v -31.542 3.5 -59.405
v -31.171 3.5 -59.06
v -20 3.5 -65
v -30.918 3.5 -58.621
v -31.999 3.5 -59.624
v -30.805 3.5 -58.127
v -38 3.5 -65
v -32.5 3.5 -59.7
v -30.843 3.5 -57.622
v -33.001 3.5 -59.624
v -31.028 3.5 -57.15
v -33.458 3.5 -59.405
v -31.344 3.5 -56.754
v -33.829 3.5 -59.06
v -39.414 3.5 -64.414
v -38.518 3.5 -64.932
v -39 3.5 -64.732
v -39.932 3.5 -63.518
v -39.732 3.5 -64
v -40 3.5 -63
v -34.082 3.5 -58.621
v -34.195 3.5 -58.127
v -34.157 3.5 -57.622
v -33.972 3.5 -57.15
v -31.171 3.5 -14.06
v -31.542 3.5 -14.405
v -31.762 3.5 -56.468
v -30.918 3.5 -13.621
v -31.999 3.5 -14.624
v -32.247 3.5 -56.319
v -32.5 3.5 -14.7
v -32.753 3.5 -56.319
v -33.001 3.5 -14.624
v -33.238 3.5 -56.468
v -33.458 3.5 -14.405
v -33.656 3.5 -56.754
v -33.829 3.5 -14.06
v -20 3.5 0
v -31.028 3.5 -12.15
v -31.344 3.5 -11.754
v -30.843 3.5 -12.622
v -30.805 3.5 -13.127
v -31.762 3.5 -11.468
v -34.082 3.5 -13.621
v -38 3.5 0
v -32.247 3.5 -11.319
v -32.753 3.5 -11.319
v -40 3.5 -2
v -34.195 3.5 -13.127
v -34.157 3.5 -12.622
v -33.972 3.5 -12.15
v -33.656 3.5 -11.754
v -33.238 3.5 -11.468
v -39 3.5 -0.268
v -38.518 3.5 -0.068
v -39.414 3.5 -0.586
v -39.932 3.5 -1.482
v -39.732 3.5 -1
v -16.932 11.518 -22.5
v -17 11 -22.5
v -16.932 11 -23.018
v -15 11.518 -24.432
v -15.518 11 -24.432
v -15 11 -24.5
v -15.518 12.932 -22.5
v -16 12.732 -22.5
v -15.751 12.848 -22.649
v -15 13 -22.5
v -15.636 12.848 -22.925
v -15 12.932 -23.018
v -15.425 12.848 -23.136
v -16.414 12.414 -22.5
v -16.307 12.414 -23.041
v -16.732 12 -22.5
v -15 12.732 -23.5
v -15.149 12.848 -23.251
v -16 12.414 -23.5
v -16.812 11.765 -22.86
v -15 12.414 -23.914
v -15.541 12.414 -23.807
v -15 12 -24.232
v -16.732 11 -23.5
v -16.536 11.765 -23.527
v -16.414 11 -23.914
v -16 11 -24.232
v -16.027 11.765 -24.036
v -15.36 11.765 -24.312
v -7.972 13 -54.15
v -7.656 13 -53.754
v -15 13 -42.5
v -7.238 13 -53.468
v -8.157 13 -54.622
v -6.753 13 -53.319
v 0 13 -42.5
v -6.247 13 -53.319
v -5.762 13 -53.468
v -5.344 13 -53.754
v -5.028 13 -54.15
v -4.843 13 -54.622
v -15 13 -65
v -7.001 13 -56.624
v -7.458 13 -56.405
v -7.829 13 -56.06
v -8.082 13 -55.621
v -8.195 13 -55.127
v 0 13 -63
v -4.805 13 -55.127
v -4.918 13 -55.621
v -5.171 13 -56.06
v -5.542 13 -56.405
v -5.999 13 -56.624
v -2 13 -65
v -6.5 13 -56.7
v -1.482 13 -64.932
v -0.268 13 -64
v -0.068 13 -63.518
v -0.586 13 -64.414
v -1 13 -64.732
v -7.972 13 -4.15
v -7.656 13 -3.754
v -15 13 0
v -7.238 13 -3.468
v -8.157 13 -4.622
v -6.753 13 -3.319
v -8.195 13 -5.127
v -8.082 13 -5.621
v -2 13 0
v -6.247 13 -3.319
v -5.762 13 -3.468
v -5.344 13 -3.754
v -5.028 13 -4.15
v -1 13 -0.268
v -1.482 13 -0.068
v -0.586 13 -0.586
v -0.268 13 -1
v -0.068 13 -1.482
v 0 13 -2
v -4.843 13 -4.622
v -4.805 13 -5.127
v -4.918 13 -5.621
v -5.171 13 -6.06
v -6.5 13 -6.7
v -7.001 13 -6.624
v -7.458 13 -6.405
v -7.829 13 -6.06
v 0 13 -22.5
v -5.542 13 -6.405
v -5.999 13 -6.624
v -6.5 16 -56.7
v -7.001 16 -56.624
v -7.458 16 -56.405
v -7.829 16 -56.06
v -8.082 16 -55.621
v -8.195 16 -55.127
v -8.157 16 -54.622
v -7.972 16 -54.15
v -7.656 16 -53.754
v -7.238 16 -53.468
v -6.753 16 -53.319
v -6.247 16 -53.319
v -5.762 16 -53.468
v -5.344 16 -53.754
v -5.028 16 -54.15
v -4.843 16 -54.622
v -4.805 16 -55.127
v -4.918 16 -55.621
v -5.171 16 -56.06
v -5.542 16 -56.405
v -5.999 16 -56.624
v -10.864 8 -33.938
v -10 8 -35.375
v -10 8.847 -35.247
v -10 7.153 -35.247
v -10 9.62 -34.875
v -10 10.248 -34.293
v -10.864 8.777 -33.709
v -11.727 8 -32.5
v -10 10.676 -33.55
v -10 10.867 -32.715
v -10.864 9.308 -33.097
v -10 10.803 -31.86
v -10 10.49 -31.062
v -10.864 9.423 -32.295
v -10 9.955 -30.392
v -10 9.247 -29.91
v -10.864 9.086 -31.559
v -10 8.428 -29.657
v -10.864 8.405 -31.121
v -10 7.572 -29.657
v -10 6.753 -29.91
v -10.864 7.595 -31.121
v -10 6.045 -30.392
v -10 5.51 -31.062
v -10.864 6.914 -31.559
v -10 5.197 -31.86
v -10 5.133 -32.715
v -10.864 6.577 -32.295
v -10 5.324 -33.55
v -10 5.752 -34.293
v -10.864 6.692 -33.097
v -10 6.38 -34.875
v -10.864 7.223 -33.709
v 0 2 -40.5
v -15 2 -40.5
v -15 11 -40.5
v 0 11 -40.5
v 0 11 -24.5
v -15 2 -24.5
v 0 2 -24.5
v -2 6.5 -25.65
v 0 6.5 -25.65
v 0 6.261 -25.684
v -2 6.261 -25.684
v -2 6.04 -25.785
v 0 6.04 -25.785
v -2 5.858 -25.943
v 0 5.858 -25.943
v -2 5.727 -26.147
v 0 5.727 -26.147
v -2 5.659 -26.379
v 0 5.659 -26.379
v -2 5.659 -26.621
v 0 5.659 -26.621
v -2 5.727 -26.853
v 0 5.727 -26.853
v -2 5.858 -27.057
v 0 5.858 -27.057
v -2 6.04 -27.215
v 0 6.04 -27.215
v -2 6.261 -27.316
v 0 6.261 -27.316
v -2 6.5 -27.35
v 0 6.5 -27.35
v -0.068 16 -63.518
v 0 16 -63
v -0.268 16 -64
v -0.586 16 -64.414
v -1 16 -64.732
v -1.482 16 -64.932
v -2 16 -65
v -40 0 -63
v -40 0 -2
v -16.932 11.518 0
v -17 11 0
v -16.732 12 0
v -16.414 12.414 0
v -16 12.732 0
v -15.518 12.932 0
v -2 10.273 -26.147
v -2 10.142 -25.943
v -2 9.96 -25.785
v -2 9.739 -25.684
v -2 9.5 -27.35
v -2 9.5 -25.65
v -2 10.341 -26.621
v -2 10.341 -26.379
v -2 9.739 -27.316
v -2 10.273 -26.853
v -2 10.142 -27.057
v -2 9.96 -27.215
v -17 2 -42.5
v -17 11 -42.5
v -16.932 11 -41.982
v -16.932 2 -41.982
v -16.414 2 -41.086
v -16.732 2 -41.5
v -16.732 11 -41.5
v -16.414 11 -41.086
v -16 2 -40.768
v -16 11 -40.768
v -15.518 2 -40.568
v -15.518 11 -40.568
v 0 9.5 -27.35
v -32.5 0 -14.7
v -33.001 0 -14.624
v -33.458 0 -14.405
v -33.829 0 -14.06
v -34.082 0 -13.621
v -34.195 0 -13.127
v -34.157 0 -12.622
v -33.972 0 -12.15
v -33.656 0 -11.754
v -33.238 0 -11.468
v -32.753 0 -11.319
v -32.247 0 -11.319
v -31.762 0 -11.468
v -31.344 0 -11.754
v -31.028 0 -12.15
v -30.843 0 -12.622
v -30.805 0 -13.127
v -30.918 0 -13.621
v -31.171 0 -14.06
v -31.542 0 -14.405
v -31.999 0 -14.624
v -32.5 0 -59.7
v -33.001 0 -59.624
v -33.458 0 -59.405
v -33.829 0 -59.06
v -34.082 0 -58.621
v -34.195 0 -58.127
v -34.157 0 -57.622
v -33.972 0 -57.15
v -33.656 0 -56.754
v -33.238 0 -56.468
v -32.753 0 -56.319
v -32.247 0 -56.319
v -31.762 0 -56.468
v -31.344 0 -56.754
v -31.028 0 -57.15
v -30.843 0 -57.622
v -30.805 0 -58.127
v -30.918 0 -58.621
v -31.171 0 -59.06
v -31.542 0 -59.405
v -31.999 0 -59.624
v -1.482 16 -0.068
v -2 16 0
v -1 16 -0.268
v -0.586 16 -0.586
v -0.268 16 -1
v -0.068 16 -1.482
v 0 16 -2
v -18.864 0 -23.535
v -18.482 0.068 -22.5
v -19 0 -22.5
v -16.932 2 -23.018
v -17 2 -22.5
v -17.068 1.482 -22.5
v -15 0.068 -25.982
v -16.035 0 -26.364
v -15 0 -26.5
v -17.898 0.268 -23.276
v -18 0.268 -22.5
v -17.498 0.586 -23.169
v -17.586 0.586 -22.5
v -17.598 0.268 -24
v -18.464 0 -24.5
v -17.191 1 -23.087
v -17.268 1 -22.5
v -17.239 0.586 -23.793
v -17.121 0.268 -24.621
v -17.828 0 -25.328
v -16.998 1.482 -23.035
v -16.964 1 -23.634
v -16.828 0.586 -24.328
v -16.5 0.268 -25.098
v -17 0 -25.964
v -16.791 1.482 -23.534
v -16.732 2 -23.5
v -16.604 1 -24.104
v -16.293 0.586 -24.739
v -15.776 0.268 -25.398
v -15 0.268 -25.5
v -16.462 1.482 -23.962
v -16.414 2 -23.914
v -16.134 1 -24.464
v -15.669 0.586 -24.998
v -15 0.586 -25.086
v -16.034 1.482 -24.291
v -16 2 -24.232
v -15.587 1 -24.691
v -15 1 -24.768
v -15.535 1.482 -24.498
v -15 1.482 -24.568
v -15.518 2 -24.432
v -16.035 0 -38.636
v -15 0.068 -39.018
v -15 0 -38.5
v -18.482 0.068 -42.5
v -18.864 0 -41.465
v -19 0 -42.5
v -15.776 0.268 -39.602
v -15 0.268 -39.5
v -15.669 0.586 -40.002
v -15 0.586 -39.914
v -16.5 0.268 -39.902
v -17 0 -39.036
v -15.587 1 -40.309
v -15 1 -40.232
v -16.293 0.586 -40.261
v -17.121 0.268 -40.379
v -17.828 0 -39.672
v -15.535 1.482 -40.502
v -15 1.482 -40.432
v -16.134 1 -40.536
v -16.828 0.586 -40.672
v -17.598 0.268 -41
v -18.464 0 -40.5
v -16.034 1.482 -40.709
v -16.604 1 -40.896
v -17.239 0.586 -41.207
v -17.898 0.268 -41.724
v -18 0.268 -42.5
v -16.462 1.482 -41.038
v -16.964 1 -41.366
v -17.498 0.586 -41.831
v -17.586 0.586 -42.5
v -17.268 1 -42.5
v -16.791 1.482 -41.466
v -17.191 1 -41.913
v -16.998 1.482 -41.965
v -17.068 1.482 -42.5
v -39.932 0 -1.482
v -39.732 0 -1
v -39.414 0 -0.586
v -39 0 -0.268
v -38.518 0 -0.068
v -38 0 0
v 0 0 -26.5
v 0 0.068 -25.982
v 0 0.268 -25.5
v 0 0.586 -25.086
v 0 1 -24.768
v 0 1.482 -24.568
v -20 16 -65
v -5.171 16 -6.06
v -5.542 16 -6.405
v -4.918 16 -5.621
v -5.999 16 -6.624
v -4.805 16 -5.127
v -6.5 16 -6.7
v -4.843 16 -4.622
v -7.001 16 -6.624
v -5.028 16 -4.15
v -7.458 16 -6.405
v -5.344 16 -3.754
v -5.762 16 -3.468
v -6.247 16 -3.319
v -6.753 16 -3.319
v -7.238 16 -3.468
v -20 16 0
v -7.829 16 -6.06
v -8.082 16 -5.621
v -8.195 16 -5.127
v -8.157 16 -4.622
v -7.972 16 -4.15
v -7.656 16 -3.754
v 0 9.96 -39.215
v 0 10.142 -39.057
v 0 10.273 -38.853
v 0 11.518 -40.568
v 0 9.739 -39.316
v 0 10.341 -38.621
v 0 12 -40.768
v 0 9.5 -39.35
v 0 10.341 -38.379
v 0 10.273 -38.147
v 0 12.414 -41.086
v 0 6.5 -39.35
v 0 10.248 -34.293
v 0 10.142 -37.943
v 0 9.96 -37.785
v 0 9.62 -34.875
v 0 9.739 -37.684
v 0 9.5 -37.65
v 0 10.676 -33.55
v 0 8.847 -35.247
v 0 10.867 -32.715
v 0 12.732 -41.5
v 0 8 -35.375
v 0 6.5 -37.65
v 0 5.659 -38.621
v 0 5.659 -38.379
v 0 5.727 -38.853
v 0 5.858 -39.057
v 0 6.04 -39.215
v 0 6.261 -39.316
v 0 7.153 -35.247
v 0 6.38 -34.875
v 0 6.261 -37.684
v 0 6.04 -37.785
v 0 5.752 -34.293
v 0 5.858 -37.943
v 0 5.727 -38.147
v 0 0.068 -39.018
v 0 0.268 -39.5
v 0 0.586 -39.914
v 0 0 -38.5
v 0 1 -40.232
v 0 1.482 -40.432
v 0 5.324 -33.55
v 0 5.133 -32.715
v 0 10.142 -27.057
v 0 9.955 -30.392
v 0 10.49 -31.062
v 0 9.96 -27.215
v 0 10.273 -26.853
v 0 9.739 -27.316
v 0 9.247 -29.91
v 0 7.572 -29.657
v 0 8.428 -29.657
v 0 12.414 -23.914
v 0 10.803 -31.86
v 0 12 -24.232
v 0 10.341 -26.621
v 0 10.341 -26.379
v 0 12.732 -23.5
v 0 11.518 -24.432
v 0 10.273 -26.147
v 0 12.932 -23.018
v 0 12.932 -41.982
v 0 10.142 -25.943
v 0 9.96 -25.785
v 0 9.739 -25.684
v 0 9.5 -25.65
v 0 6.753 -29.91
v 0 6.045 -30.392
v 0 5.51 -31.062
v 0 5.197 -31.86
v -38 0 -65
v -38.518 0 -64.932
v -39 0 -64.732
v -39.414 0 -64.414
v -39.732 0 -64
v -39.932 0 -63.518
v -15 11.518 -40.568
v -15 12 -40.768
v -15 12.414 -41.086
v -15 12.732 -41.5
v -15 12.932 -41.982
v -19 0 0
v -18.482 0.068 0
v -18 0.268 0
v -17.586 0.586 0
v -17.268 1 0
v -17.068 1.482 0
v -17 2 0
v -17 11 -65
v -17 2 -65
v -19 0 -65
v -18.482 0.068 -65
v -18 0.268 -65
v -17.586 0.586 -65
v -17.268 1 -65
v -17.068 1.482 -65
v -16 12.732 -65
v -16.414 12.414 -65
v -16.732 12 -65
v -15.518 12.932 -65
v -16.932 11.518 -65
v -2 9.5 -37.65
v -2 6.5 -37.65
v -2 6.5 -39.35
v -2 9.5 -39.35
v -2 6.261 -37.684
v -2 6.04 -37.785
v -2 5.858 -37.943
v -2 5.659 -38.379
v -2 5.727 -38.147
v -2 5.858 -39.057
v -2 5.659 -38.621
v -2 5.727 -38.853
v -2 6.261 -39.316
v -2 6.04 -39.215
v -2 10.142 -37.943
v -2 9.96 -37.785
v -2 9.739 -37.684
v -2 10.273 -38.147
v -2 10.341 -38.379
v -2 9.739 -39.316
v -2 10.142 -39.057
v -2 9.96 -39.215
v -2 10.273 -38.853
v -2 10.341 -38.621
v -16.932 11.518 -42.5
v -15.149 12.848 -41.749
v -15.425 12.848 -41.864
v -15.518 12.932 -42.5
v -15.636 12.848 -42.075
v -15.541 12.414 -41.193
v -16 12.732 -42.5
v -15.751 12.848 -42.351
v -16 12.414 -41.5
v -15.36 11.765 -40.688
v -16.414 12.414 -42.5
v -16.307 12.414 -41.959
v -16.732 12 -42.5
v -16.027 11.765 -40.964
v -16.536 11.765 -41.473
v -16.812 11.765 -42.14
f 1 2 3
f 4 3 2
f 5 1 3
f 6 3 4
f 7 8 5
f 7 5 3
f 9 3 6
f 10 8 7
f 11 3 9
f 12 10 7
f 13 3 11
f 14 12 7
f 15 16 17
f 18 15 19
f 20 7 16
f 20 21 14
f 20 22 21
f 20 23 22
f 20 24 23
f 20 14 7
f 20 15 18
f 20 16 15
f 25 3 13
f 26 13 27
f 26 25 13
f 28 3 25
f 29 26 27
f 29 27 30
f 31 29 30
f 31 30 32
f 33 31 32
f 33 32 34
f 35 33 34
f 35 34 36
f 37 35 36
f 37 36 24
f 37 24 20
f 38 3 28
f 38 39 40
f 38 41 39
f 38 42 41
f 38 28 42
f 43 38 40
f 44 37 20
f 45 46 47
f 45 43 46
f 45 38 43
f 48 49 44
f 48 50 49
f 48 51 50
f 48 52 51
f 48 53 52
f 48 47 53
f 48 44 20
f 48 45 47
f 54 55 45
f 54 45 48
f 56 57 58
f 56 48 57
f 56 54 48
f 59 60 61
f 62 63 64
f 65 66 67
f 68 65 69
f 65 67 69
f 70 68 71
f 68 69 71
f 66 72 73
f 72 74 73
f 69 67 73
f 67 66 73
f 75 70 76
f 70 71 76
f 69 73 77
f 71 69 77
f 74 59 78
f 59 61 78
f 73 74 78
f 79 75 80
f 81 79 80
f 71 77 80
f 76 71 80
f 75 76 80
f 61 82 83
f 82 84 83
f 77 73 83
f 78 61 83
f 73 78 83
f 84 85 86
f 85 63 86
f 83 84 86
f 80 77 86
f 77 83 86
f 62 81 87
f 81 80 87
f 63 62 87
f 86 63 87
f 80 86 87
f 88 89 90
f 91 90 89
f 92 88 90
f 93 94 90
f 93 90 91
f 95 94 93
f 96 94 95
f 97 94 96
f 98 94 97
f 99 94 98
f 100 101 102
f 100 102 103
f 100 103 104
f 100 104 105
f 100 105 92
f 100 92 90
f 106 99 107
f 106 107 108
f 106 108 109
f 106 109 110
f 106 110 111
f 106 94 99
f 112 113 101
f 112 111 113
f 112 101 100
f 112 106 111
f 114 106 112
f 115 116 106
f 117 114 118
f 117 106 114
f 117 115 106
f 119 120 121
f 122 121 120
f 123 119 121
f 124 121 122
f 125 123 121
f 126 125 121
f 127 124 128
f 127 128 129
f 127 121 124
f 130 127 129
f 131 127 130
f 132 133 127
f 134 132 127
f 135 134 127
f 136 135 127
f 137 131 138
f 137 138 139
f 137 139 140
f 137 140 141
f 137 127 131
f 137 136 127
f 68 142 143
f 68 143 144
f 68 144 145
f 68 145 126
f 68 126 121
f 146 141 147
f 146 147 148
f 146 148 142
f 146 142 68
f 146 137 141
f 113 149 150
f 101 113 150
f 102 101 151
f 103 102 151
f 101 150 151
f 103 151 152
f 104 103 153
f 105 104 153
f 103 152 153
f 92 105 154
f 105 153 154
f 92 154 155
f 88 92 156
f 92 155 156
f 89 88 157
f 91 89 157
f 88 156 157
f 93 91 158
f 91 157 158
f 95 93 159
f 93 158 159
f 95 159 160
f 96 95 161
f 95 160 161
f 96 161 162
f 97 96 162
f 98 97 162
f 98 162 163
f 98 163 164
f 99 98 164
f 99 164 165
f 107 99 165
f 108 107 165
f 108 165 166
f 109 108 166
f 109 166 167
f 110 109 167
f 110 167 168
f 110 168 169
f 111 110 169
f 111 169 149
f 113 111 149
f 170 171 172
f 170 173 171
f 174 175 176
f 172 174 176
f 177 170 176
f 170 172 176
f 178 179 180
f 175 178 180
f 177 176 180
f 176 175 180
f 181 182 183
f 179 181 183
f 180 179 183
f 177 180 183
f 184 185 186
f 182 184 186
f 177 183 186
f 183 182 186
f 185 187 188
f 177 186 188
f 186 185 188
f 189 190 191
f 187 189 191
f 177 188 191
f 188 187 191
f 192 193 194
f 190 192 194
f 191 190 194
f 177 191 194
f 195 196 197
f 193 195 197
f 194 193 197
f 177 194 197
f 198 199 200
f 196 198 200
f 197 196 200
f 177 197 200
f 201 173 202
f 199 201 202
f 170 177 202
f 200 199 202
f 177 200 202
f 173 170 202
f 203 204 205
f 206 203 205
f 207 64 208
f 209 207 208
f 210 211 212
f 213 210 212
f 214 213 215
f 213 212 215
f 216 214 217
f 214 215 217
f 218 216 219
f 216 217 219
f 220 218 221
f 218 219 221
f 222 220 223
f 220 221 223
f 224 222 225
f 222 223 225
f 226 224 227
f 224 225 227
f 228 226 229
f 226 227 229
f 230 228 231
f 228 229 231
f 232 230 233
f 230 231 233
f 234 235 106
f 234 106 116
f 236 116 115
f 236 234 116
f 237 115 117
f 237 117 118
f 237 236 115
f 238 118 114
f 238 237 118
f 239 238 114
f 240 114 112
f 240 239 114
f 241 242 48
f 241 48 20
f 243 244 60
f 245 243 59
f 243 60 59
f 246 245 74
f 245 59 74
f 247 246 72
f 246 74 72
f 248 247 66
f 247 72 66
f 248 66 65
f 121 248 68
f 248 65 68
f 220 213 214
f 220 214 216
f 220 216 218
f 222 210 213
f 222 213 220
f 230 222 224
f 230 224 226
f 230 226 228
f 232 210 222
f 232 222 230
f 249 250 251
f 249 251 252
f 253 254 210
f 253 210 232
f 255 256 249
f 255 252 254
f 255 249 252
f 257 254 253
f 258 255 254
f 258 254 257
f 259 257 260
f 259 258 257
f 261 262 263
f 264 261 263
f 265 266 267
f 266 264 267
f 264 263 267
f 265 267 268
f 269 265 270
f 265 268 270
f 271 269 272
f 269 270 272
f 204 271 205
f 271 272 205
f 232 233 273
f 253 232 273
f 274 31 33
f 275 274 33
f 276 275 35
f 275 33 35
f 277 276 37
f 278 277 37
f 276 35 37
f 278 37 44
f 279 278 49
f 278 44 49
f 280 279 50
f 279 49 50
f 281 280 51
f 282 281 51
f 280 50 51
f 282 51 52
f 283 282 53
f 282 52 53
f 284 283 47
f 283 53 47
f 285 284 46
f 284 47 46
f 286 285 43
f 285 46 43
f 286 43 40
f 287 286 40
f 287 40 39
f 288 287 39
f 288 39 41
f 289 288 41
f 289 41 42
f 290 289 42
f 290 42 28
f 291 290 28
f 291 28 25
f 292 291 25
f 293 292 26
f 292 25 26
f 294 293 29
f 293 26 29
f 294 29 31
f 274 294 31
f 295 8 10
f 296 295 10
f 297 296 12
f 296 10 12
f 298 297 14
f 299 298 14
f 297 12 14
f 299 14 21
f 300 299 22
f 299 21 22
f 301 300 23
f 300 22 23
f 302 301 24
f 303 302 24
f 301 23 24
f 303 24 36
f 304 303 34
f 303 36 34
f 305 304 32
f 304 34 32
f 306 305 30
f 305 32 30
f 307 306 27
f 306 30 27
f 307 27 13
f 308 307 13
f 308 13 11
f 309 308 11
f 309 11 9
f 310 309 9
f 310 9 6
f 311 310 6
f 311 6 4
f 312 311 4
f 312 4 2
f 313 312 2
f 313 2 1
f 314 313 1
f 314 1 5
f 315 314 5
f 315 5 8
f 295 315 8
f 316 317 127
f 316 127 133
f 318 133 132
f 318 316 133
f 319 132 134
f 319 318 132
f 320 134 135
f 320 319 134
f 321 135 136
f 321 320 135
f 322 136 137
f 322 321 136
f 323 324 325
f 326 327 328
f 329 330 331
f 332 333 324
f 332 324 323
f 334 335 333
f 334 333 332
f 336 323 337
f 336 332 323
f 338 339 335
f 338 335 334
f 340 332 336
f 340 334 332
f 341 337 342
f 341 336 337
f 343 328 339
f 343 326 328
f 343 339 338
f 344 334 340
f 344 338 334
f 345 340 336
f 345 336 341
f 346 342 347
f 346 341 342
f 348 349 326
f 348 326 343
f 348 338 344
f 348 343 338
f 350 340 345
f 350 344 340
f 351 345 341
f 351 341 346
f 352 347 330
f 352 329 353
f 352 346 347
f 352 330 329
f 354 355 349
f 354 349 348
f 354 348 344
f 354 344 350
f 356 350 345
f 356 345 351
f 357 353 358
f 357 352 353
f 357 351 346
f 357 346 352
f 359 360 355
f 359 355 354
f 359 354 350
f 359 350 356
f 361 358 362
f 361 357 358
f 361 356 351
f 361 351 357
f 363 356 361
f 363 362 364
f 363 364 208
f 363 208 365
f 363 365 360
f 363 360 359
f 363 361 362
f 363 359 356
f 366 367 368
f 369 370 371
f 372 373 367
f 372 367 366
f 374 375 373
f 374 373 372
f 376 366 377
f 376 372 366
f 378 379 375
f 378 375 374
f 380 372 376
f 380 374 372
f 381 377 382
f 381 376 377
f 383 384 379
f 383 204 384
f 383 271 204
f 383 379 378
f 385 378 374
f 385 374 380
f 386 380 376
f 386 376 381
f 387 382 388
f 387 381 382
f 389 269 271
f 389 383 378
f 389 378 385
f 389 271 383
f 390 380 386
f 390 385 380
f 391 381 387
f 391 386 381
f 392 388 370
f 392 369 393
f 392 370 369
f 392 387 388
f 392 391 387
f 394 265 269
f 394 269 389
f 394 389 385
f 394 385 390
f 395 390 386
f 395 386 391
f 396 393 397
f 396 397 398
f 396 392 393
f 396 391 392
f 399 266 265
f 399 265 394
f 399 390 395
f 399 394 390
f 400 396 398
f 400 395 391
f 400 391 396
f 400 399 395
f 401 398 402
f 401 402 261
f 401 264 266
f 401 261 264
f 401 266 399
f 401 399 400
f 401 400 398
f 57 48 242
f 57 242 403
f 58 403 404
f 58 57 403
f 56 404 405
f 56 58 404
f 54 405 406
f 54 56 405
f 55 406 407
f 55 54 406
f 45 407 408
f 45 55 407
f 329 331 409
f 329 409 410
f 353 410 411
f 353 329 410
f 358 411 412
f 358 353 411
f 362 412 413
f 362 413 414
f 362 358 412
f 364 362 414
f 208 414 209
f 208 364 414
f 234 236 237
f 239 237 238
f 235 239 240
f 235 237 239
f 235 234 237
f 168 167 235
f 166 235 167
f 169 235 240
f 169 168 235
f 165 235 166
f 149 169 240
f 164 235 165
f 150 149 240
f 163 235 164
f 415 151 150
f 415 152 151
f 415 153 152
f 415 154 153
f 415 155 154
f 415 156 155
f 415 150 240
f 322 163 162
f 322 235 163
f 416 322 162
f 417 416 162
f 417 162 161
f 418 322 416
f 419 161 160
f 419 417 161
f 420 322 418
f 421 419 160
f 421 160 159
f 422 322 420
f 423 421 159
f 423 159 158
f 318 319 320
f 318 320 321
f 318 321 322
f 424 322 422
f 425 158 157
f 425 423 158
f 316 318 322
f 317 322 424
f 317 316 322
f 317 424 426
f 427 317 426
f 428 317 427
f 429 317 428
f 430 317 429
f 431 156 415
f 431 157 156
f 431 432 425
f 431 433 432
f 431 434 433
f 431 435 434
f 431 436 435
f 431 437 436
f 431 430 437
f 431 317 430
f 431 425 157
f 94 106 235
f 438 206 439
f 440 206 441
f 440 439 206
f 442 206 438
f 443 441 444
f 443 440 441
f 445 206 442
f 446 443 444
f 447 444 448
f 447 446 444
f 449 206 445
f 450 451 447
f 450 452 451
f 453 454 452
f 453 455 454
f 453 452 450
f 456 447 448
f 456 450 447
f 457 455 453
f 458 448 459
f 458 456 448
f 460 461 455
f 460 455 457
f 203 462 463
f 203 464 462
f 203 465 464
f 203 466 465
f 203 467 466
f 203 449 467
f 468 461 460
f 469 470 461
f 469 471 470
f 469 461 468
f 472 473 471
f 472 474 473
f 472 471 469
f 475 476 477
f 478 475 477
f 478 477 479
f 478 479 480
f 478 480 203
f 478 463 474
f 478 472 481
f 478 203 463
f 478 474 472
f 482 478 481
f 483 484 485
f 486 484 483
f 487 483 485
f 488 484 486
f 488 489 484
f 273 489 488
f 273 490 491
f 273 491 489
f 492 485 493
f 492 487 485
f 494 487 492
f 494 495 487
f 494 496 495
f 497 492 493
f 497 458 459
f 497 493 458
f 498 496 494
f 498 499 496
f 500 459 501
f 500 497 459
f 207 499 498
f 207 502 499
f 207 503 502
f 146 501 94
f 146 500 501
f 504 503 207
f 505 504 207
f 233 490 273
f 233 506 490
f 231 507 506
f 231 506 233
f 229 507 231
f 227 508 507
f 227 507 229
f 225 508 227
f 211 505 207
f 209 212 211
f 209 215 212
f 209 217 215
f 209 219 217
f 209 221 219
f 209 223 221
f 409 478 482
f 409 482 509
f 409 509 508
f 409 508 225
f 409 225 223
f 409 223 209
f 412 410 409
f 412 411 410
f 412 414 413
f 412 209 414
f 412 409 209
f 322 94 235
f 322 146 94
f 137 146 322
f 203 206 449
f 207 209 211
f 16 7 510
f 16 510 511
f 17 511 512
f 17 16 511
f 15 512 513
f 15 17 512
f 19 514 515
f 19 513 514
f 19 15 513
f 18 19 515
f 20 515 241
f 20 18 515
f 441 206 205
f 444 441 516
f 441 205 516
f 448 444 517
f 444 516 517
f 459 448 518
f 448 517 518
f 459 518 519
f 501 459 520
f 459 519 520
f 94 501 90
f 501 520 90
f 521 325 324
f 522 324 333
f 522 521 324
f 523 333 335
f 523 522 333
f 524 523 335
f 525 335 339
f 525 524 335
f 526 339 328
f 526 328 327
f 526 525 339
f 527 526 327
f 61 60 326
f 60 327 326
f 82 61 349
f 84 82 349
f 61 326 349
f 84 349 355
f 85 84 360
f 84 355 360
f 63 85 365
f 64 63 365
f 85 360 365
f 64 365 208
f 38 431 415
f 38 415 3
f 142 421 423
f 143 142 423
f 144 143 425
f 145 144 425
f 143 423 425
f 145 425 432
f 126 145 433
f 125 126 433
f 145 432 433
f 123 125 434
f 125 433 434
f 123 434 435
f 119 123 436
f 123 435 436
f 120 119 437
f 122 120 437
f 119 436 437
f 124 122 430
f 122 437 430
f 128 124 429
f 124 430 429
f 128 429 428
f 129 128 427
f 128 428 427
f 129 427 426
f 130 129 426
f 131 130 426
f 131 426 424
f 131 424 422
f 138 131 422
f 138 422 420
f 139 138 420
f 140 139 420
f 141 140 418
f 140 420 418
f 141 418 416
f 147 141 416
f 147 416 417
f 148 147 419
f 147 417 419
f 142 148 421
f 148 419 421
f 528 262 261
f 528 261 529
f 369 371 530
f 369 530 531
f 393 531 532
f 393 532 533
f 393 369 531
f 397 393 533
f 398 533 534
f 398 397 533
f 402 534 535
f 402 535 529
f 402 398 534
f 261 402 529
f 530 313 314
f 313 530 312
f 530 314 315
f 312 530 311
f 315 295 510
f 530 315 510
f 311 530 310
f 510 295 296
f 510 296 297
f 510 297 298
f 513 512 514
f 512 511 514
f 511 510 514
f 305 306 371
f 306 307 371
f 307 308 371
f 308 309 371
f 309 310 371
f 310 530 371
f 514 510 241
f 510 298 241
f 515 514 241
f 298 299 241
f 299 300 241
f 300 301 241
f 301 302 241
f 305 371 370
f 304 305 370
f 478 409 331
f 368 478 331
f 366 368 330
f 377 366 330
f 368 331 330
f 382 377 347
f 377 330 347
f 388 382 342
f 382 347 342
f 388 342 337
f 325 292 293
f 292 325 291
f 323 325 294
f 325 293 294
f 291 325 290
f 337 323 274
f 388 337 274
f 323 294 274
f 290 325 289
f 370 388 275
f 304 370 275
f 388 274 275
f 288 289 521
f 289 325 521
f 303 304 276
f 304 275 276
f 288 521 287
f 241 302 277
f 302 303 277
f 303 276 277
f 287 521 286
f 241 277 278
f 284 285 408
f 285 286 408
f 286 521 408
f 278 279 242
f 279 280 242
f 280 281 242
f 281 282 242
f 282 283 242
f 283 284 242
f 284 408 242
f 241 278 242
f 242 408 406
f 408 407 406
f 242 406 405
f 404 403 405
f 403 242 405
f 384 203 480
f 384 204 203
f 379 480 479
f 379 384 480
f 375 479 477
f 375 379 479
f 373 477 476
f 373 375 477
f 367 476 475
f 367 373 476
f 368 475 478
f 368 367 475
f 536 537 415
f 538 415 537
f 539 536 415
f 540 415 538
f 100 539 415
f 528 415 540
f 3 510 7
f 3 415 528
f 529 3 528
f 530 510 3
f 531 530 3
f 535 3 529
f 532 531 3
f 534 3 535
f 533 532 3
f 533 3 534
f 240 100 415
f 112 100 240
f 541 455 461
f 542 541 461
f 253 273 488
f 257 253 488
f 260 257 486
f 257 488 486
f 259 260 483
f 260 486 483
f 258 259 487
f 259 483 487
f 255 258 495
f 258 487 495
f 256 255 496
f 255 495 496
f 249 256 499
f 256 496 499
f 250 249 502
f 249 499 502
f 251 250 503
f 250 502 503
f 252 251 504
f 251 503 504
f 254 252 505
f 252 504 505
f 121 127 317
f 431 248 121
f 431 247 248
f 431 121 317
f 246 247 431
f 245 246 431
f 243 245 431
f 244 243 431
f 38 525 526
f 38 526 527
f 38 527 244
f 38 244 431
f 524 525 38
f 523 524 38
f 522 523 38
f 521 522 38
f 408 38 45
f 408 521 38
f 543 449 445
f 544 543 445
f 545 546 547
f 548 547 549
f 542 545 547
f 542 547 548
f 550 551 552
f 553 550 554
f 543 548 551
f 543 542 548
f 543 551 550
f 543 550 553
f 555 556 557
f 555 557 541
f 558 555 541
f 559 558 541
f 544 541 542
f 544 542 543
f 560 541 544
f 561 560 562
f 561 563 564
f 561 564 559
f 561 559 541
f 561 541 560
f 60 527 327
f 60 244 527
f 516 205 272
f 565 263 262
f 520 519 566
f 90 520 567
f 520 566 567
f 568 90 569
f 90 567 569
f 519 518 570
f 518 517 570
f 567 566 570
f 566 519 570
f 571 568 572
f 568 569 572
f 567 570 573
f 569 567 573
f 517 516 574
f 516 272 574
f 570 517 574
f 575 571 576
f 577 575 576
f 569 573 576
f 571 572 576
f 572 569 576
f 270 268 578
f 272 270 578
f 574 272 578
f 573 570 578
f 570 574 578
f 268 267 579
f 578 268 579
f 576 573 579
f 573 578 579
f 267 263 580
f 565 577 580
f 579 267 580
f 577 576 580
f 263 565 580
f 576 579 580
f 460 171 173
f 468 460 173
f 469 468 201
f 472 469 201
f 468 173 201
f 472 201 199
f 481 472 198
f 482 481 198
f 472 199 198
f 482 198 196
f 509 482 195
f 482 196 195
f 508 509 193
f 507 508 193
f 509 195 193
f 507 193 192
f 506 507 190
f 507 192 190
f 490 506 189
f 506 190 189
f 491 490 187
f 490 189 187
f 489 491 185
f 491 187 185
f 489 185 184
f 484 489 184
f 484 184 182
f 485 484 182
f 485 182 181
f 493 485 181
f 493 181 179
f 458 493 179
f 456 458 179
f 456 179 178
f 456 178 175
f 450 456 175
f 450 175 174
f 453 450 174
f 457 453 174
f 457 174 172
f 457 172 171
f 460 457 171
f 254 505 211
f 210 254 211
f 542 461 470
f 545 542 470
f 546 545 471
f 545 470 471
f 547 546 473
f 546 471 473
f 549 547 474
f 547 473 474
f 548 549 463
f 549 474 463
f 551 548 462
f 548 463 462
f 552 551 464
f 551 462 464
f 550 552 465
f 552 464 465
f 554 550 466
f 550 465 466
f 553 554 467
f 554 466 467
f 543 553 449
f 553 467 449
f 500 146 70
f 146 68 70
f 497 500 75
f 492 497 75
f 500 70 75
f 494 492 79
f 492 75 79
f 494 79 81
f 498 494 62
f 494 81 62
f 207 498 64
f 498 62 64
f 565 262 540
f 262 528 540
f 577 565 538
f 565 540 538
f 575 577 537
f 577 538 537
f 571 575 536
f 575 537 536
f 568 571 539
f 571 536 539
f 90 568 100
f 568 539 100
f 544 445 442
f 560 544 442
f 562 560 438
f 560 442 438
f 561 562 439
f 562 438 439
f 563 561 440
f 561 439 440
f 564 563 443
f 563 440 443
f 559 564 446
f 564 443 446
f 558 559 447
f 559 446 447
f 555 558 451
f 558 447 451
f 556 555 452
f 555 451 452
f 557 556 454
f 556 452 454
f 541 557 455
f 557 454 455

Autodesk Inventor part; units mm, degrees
ref_plane "YZ Plane" through (0, 0, 0) normal (1, 0, 0) x (0, 1, 0)
ref_plane "XZ Plane" through (0, 0, 0) normal (0, 1, 0) x (-1, 0, 0)
ref_plane "XY Plane" through (0, 0, 0) normal (0, 0, 1) x (1, 0, 0)
sketch "Sketch1" plane through (0, 0, 0) normal (0, 1, 0) x (-1, 0, 0)
  line L0 (0, 0) -> (40, 0)
  line L1 (40, 0) -> (40, -65)
  line L2 (40, -65) -> (0, -65)
  line L3 (0, -65) -> (0, 0)
  dimension "d0" = 40
  dimension "d1" = 65
extrude "Extrusion1" add sketch "Sketch1" along normal blind 16
sketch "Sketch2" plane through (-40, 0, 0) normal (0, 0, 1) x (1, 0, 0)
  line L0 (0, 16) -> (40, 16) projected
  line L1 (0, 16) -> (20, 16)
  line L2 (20, 16) -> (20, 3.5)
  line L3 (20, 3.5) -> (0, 3.5)
  line L4 (0, 3.5) -> (0, 16)
  line L5 (40, 0) -> (0, 0) projected
  dimension "d4" = 20
  dimension "d5" = 3.5
extrude "Extrusion2" cut sketch "Sketch2" against normal through all
sketch "Sketch3" plane through (0, 0, 0) normal (0, -1, 0) x (1, 0, 0)
  line L0 (-32.5, -58) -> (-32.5, -13) construction
  line L1 (-6.5, -55) -> (-6.5, -5) construction
  line L2 (-40, -65) -> (0, -65) construction
  line L3 (0, 0) -> (-40, 0) construction
  line L4 (0, -65) -> (0, 0) construction
  line L5 (-40, 0) -> (-40, -65) construction
  dimension "d8" = 45
  dimension "d9" = 50
  dimension "d10" = 7
  dimension "d11" = 5
  dimension "d12" = 6.5
  dimension "d13" = 7.5
hole "Hole1" at (-32.5, 0, -58) at (-32.5, 0, -13) at (-6.5, 0, -55) at (-6.5, 0, -5) direction (0, 1, 0) diameter 3.4 end through all clearance for "Flat Head Machine Screw" size "M3" standard "Ansi Metric M Profile"
sketch "Sketch4" plane through (0, 0, 0) normal (1, 0, 0) x (0, 0, -1)
  line L0 (38.5, 6.5) -> (38.5, 9.5) construction
  line L1 (39.35, 6.5) -> (39.35, 9.5)
  line L2 (37.65, 9.5) -> (37.65, 6.5)
  arc A0 (37.65, 6.5) -> (39.35, 6.5) centre (38.5, 6.5) ccw
  arc A1 (39.35, 9.5) -> (37.65, 9.5) centre (38.5, 9.5) ccw
  line L3 (26.5, 6.5) -> (26.5, 9.5) construction
  line L4 (27.35, 6.5) -> (27.35, 9.5)
  line L5 (25.65, 9.5) -> (25.65, 6.5)
  arc A2 (25.65, 6.5) -> (27.35, 6.5) centre (26.5, 6.5) ccw
  arc A3 (27.35, 9.5) -> (25.65, 9.5) centre (26.5, 9.5) ccw
  line L6 (0, 0) -> (0, 16) construction
  line L7 (65, 0) -> (65, 16) construction
  line L8 (38.5, 8) -> (26.5, 8) construction
  line L9 (65, 0) -> (0, 0) construction
  line L10 (0, 16) -> (65, 16) construction
  line L11 (65, 0) -> (40.5, 0)
  line L12 (40.5, 0) -> (40.5, 13)
  line L13 (40.5, 13) -> (65, 13)
  line L14 (65, 13) -> (65, 0)
  line L15 (24.5, 0) -> (0, 0)
  line L16 (0, 0) -> (0, 13)
  line L17 (0, 13) -> (24.5, 13)
  line L18 (24.5, 13) -> (24.5, 0)
  point P0 (32.5, 8)
  dimension "d21" = 12
  dimension "d22" = 6
  dimension "d23" = 65
  dimension "d24" = 32.5
  dimension "d25" = 3
  dimension "d26" = 3
  dimension "d27" = 0.85
  dimension "d28" = 0.85
  dimension "d29" = 0
  dimension "d30" = 16
  dimension "d31" = 8
  dimension "d32" = 3
  dimension "d33" = 3
  dimension "d34" = 16
  dimension "d35" = 8
extrude "Extrusion3" cut sketch "Sketch4" against normal blind 2 contours A0 L2 A1 L1 | A2 L5 A3 L4
extrude "Extrusion4" cut sketch "Sketch4" against normal blind 17 contours L11 L12 L13 L14 | L15 L16 L17 L18
fillet "Fillet1" radius 2 14 edges at (-8.5, 0, -40.5) (-8.5, 0, -24.5) (-40, 1.75, -65) (-40, 1.75, 0) (0, 14.5, 0) (0, 14.5, -65) (-17, 0, -52.75) (-17, 0, -12.25) (-17, 6.5, -40.5) (-17, 6.5, -24.5) (-17, 13, -52.75) (-8.5, 13, -40.5) (-17, 13, -12.25) (-8.5, 13, -24.5)
hole "Hole2" at (0, 8, -32.5) direction (-1, 0, 0) diameter 5.75 depth 10 tip angle 118
equation "\"d22\" = 0.5 * d21"
equation "\"d24\" = 0.5 * d23"
equation "\"d26\" = d25"
equation "\"d28\" = d27"
equation "\"d31\" = 0.5 * d30"
equation "\"d35\" = 0.5 * d34"
properties part number "Dual Camera Mount"
